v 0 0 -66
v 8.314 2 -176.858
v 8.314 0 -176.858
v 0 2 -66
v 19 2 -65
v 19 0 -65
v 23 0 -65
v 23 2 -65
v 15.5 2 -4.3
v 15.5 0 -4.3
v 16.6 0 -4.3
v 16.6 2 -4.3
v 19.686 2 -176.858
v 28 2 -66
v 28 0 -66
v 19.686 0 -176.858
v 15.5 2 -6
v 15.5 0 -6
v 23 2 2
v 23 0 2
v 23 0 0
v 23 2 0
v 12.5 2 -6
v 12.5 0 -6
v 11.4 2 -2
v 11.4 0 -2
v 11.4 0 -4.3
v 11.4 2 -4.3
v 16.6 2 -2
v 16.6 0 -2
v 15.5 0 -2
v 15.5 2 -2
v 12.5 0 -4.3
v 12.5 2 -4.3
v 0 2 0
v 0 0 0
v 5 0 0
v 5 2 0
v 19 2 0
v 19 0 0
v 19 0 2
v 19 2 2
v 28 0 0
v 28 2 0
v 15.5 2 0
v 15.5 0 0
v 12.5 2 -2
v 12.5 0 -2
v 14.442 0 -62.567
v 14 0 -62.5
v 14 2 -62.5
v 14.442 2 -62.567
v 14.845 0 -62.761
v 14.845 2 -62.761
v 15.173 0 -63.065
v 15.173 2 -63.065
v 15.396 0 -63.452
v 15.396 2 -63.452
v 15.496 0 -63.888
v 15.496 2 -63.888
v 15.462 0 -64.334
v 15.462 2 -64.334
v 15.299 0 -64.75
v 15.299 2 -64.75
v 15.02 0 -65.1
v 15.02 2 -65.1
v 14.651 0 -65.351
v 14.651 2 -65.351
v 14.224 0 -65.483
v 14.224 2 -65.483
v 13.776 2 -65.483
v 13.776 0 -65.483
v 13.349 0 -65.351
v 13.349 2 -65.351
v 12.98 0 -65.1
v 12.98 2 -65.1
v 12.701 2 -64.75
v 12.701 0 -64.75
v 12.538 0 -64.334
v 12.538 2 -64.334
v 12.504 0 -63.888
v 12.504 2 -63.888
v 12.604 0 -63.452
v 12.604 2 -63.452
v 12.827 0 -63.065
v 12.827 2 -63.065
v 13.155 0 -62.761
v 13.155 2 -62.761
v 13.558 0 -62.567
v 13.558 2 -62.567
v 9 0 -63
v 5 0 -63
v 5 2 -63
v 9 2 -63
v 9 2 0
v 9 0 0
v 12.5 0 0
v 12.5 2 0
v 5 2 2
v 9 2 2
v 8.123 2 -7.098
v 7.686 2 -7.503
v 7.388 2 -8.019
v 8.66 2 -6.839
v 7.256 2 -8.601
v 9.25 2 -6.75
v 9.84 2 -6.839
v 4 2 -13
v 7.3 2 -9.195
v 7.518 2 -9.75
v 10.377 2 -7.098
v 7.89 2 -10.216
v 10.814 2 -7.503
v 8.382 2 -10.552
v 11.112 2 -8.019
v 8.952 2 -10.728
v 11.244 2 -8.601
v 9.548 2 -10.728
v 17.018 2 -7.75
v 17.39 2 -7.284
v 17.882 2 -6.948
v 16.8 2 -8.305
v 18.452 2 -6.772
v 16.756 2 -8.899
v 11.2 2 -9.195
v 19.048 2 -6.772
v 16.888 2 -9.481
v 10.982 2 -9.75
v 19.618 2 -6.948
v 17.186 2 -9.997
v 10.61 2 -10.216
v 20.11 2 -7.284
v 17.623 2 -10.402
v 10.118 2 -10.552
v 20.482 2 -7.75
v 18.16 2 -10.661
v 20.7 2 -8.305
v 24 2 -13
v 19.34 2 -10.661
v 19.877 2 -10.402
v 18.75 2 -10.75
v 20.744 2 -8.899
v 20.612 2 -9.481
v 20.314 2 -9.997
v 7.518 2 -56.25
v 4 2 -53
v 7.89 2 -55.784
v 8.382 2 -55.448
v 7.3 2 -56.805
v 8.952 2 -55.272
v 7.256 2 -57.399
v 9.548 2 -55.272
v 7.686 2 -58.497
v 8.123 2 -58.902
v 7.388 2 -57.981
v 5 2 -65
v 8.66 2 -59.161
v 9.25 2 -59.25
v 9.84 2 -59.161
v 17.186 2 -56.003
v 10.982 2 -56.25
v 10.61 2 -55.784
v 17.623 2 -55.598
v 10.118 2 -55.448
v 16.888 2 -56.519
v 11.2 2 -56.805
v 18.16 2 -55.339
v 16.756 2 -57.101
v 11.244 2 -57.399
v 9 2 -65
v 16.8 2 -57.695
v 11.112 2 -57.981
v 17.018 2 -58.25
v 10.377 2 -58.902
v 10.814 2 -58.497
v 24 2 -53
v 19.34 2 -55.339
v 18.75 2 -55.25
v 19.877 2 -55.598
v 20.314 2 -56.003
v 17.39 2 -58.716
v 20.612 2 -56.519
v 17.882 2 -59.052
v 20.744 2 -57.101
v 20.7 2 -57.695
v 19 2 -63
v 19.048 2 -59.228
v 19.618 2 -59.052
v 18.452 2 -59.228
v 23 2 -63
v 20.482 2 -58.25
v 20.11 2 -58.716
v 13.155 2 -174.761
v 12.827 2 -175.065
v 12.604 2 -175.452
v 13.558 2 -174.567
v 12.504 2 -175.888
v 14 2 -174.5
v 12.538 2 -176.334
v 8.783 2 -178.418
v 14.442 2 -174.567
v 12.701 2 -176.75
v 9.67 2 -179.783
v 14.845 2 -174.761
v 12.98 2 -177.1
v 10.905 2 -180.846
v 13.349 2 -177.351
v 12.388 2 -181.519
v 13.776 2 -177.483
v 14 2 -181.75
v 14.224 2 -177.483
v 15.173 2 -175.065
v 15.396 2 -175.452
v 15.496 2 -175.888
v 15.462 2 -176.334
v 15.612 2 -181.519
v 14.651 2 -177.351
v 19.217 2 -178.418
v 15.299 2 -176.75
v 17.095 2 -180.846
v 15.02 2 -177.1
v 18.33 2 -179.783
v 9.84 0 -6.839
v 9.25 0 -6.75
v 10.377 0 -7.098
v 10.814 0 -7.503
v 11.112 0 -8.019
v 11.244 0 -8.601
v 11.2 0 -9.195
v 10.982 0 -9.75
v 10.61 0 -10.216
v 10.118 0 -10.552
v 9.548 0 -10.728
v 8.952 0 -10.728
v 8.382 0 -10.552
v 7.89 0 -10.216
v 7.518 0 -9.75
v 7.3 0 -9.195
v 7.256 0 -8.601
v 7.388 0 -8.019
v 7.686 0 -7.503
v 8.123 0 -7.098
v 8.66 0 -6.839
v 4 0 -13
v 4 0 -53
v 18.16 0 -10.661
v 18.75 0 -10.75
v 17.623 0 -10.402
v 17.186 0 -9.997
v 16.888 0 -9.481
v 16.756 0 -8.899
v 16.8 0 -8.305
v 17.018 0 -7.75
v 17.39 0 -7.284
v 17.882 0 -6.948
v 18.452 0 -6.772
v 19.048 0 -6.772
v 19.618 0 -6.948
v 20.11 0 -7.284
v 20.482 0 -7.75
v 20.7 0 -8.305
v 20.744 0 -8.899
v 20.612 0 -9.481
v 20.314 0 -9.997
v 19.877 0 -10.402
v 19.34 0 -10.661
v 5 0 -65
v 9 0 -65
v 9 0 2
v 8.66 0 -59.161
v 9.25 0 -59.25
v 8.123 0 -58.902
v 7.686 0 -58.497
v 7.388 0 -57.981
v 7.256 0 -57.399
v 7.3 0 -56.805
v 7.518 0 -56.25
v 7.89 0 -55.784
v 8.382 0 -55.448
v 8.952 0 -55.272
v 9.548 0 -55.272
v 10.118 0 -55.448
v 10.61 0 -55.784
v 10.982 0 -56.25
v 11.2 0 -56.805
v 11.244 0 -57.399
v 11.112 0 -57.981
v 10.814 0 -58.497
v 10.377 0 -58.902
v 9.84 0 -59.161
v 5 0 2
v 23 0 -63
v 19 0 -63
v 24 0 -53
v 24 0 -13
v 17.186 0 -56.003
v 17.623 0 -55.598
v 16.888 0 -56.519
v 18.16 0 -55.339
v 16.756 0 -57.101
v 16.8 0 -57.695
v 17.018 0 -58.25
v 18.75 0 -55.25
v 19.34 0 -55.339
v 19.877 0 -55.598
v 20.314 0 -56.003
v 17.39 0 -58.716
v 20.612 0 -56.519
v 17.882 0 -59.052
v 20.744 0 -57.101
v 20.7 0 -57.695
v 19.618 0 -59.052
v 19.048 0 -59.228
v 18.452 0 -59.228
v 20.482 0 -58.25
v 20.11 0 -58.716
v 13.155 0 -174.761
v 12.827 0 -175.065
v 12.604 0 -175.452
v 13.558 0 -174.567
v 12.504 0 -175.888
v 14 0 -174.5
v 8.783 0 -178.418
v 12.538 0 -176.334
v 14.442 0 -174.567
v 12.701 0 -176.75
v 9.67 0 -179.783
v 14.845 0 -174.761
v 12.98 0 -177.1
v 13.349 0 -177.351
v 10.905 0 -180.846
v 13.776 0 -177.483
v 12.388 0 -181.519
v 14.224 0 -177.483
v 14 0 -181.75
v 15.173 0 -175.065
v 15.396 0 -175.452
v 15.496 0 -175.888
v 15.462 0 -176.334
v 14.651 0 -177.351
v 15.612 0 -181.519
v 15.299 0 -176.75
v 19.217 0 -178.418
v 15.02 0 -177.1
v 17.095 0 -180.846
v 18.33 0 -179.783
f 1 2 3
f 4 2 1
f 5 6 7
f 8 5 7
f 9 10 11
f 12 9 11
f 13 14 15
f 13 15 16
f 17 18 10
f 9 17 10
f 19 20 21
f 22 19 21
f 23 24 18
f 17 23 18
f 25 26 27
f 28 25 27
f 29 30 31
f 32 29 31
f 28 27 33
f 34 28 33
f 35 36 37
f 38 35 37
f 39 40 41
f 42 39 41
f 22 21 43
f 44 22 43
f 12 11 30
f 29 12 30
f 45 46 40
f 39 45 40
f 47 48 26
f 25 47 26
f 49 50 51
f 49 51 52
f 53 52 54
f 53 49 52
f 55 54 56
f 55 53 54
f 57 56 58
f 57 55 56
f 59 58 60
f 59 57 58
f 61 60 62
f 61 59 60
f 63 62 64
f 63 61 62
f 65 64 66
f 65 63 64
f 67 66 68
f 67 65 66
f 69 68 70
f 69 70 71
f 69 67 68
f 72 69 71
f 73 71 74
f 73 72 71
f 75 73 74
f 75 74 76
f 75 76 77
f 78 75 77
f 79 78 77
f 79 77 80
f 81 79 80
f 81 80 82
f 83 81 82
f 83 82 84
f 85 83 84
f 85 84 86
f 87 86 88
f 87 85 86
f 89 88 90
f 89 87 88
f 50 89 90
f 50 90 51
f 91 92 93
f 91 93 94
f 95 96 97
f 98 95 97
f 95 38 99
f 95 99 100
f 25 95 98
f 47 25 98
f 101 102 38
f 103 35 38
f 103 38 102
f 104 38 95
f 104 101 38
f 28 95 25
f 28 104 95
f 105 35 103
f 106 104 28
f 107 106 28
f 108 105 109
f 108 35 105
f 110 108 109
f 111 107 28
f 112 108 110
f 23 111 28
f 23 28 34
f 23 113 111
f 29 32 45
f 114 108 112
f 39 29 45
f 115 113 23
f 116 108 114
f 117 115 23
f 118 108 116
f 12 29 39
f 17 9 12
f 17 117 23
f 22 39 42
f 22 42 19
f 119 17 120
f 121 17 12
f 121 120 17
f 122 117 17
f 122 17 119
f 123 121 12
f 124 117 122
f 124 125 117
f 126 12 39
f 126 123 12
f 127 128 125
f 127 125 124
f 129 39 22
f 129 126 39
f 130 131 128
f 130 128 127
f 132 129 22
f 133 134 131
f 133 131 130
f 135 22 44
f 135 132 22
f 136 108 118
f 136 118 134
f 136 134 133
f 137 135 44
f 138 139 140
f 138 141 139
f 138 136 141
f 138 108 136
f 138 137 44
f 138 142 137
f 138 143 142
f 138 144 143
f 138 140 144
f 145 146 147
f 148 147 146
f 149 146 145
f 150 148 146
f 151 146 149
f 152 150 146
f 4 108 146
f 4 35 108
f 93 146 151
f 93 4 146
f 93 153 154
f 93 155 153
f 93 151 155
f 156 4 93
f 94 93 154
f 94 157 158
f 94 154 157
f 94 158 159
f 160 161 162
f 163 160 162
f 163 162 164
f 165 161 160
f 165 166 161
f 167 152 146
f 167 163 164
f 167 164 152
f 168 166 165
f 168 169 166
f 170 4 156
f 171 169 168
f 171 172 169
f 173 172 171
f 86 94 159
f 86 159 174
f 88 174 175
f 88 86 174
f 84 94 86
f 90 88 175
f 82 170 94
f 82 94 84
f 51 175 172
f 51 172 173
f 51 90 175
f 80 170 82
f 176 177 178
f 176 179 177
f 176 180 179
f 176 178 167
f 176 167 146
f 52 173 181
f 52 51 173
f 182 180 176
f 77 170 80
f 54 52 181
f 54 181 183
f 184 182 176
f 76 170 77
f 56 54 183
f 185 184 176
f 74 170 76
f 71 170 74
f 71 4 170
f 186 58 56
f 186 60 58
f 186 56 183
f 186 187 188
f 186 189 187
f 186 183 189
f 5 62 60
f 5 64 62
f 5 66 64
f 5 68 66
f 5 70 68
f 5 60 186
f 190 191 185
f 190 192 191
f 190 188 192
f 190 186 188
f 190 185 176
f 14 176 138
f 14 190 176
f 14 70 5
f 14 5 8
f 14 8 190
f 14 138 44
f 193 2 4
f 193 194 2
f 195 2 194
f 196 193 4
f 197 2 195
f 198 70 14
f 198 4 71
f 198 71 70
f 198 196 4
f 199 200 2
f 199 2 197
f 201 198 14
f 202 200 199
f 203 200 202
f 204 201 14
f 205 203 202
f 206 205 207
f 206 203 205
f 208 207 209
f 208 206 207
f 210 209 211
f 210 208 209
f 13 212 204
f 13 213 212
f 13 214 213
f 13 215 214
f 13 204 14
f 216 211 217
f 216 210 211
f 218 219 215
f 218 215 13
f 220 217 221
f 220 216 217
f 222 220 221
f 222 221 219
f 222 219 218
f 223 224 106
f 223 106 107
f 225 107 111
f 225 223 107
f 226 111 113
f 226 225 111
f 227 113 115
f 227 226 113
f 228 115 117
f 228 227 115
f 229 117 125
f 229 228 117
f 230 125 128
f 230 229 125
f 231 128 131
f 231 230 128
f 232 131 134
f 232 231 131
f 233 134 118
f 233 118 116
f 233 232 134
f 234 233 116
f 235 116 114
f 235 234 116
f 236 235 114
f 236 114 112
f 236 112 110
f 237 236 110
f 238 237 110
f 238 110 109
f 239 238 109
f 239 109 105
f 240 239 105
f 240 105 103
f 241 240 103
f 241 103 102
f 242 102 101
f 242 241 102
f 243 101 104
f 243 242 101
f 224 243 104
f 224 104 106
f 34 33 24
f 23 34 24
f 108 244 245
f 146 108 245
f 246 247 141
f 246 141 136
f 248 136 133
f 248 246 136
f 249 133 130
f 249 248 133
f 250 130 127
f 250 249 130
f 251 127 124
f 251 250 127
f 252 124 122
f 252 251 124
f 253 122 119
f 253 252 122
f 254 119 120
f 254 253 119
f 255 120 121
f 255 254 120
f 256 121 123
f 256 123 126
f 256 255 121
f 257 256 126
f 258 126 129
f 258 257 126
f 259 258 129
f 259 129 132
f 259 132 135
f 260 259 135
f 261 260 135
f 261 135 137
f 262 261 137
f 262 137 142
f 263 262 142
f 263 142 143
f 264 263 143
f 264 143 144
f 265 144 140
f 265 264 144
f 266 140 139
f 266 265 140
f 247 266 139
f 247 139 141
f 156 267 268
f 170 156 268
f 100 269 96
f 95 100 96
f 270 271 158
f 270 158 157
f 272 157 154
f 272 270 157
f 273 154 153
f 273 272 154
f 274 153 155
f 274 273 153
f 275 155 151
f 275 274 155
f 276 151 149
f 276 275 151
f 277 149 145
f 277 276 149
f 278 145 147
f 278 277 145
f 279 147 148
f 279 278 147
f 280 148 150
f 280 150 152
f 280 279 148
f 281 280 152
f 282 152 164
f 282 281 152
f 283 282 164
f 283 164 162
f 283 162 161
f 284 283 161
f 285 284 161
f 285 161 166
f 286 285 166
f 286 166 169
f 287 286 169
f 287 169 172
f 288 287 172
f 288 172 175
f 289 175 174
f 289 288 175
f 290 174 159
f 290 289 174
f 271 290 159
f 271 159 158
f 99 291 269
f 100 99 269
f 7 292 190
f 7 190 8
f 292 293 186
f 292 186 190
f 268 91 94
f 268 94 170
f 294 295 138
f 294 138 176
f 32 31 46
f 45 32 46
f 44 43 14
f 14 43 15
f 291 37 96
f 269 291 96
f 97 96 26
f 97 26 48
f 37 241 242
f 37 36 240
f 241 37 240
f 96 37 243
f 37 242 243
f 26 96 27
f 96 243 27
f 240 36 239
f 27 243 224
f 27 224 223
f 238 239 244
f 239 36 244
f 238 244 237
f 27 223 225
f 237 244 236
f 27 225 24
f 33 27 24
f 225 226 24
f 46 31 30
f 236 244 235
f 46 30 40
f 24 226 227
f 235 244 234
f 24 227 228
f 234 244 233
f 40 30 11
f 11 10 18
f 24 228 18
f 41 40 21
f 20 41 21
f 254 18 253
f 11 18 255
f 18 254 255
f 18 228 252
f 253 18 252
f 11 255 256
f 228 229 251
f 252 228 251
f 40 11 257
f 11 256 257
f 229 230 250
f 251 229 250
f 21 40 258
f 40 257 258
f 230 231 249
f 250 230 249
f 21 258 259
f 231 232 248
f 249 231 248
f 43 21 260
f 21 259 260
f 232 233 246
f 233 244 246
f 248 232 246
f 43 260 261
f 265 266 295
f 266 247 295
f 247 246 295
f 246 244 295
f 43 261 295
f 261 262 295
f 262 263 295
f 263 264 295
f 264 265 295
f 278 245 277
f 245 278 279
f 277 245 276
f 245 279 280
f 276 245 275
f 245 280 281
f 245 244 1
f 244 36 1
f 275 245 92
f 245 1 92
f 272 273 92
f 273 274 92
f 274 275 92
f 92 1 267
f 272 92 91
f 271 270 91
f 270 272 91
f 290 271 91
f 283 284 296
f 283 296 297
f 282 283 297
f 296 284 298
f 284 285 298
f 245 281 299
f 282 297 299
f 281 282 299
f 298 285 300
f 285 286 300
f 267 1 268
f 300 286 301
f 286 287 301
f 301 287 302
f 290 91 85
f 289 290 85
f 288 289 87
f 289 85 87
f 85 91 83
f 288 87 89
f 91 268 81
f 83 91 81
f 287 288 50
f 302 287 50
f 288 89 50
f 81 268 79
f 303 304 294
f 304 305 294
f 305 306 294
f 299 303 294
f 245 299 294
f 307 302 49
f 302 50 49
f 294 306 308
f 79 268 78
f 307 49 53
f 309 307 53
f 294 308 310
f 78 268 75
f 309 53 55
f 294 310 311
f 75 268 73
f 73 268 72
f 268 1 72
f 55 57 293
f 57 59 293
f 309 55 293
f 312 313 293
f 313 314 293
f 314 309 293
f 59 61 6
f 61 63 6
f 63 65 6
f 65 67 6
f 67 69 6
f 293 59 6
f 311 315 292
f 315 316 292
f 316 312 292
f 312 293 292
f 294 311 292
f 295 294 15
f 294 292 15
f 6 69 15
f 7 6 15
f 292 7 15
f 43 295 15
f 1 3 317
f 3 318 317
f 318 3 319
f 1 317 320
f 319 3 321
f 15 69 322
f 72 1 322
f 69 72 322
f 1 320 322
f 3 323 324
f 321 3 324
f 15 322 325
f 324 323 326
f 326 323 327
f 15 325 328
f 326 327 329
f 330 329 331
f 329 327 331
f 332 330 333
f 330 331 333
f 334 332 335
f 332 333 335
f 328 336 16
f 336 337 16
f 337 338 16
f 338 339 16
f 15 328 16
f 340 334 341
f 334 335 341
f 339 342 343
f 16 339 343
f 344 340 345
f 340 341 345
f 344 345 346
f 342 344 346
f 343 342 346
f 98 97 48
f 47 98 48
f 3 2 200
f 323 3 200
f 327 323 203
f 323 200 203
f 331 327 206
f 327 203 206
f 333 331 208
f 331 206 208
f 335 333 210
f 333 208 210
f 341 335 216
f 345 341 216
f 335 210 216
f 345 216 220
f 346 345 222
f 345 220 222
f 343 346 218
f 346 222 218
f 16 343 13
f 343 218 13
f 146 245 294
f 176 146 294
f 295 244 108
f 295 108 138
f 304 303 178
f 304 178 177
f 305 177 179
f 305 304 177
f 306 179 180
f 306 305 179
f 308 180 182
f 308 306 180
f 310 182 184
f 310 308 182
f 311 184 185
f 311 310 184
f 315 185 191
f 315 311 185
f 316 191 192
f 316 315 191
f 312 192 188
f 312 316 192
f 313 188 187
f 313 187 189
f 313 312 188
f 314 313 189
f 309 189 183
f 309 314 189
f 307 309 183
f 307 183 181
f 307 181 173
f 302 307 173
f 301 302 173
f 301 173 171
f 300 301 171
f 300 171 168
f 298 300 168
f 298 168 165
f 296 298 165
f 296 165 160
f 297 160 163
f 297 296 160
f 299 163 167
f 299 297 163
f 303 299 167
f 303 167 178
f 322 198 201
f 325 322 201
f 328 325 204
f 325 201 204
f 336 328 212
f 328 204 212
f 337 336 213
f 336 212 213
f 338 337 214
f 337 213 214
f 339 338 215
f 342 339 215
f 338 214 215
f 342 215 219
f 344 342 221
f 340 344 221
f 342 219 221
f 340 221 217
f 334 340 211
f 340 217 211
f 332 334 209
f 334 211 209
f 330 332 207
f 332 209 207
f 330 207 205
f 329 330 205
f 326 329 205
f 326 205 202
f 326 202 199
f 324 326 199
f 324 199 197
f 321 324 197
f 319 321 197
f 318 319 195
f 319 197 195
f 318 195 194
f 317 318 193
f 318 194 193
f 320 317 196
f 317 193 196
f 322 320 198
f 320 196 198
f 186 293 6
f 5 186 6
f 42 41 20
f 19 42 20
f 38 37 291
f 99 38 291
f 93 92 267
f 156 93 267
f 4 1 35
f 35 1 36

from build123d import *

# Parameters (mm, degrees)
SKETCH1_R           = 2
SKETCH1_R_2         = 1.5
SKETCH1_W           = 20
SKETCH1_H           = 40
SKETCH1_W_2         = 4
SKETCH1_H_2         = 2
BOSS_EXTRUDE1_DEPTH = 2
BOSS_EXTRUDE2_DEPTH = 2
SKETCH4_R           = 1.5
CUT_EXTRUDE1_DEPTH  = 2


with BuildPart() as part:
    # Sketch1 → Boss-Extrude1 (new body)
    with BuildSketch(Plane(origin=(0, 0, 0), x_dir=(1, 0, 0), z_dir=(0, 1, 0))):
        Polygon((0, 0), (5, 0), (5, -2), (9, -2), (9, 0), (12.5, 0), (12.5, 2), (11.4, 2), (11.4, 4.3), (12.5, 4.3), (12.5, 6), (15.5, 6), (15.5, 4.3), (16.6, 4.3), (16.6, 2), (15.5, 2), (15.5, 0), (19, 0), (19, -2), (23, -2), (23, 0), (28, 0), (28, 66), (0, 66), align=None)
        with Locations(Location((18.75, 57.25, 0), (0, 0, 270))):
            Circle(SKETCH1_R, mode=Mode.SUBTRACT)
        with Locations(Location((9.25, 57.25, 0), (0, 0, 90))):
            Circle(SKETCH1_R, mode=Mode.SUBTRACT)
        with Locations(Location((18.75, 8.75, 0), (0, 0, 90))):
            Circle(SKETCH1_R, mode=Mode.SUBTRACT)
        with Locations(Location((9.25, 8.75, 0), (0, 0, 270))):
            Circle(SKETCH1_R, mode=Mode.SUBTRACT)
        with Locations(Location((14, 64, 0), (0, 0, 270))):
            Circle(SKETCH1_R_2, mode=Mode.SUBTRACT)
        with Locations((14, 33)):
            Rectangle(SKETCH1_W, SKETCH1_H, mode=Mode.SUBTRACT)
        with Locations((7, 64)):
            Rectangle(SKETCH1_W_2, SKETCH1_H_2, mode=Mode.SUBTRACT)
        with Locations((21, 64)):
            Rectangle(SKETCH1_W_2, SKETCH1_H_2, mode=Mode.SUBTRACT)
    extrude(amount=BOSS_EXTRUDE1_DEPTH)

    # Sketch2 → Boss-Extrude2 (add)
    with BuildSketch(Plane(origin=(0, 2, 0), x_dir=(1, 0, 0), z_dir=(0, 1, 0))):
        with BuildLine():
            Line((9, 186), (0, 66))
            Line((0, 66), (28, 66))
            Line((28, 66), (19, 186))
            ThreePointArc((19, 186), (14, 191), (9, 186))
        make_face()
    extrude(amount=-BOSS_EXTRUDE2_DEPTH)

    # Sketch4 → Cut-Extrude1 (cut)
    with BuildSketch(Plane(origin=(0, 2, 0), x_dir=(1, 0, 0), z_dir=(0, 1, 0))):
        with Locations(Location((14, 176, 0), (0, 0, 270))):
            Circle(SKETCH4_R)
        with BuildLine():
            Line((1.336247038, 176), (8.25, 176))
            ThreePointArc((8.25, 176), (14, 181.75), (19.75, 176))
            Line((19.75, 176), (26.690607085, 176))
            Line((26.690607085, 176), (26.690607085, 198.806068599))
            Line((26.690607085, 198.806068599), (1.336247038, 198.806068599))
            Line((1.336247038, 198.806068599), (1.336247038, 176))
        make_face()
    extrude(amount=-CUT_EXTRUDE1_DEPTH, mode=Mode.SUBTRACT)


solid = part.part
